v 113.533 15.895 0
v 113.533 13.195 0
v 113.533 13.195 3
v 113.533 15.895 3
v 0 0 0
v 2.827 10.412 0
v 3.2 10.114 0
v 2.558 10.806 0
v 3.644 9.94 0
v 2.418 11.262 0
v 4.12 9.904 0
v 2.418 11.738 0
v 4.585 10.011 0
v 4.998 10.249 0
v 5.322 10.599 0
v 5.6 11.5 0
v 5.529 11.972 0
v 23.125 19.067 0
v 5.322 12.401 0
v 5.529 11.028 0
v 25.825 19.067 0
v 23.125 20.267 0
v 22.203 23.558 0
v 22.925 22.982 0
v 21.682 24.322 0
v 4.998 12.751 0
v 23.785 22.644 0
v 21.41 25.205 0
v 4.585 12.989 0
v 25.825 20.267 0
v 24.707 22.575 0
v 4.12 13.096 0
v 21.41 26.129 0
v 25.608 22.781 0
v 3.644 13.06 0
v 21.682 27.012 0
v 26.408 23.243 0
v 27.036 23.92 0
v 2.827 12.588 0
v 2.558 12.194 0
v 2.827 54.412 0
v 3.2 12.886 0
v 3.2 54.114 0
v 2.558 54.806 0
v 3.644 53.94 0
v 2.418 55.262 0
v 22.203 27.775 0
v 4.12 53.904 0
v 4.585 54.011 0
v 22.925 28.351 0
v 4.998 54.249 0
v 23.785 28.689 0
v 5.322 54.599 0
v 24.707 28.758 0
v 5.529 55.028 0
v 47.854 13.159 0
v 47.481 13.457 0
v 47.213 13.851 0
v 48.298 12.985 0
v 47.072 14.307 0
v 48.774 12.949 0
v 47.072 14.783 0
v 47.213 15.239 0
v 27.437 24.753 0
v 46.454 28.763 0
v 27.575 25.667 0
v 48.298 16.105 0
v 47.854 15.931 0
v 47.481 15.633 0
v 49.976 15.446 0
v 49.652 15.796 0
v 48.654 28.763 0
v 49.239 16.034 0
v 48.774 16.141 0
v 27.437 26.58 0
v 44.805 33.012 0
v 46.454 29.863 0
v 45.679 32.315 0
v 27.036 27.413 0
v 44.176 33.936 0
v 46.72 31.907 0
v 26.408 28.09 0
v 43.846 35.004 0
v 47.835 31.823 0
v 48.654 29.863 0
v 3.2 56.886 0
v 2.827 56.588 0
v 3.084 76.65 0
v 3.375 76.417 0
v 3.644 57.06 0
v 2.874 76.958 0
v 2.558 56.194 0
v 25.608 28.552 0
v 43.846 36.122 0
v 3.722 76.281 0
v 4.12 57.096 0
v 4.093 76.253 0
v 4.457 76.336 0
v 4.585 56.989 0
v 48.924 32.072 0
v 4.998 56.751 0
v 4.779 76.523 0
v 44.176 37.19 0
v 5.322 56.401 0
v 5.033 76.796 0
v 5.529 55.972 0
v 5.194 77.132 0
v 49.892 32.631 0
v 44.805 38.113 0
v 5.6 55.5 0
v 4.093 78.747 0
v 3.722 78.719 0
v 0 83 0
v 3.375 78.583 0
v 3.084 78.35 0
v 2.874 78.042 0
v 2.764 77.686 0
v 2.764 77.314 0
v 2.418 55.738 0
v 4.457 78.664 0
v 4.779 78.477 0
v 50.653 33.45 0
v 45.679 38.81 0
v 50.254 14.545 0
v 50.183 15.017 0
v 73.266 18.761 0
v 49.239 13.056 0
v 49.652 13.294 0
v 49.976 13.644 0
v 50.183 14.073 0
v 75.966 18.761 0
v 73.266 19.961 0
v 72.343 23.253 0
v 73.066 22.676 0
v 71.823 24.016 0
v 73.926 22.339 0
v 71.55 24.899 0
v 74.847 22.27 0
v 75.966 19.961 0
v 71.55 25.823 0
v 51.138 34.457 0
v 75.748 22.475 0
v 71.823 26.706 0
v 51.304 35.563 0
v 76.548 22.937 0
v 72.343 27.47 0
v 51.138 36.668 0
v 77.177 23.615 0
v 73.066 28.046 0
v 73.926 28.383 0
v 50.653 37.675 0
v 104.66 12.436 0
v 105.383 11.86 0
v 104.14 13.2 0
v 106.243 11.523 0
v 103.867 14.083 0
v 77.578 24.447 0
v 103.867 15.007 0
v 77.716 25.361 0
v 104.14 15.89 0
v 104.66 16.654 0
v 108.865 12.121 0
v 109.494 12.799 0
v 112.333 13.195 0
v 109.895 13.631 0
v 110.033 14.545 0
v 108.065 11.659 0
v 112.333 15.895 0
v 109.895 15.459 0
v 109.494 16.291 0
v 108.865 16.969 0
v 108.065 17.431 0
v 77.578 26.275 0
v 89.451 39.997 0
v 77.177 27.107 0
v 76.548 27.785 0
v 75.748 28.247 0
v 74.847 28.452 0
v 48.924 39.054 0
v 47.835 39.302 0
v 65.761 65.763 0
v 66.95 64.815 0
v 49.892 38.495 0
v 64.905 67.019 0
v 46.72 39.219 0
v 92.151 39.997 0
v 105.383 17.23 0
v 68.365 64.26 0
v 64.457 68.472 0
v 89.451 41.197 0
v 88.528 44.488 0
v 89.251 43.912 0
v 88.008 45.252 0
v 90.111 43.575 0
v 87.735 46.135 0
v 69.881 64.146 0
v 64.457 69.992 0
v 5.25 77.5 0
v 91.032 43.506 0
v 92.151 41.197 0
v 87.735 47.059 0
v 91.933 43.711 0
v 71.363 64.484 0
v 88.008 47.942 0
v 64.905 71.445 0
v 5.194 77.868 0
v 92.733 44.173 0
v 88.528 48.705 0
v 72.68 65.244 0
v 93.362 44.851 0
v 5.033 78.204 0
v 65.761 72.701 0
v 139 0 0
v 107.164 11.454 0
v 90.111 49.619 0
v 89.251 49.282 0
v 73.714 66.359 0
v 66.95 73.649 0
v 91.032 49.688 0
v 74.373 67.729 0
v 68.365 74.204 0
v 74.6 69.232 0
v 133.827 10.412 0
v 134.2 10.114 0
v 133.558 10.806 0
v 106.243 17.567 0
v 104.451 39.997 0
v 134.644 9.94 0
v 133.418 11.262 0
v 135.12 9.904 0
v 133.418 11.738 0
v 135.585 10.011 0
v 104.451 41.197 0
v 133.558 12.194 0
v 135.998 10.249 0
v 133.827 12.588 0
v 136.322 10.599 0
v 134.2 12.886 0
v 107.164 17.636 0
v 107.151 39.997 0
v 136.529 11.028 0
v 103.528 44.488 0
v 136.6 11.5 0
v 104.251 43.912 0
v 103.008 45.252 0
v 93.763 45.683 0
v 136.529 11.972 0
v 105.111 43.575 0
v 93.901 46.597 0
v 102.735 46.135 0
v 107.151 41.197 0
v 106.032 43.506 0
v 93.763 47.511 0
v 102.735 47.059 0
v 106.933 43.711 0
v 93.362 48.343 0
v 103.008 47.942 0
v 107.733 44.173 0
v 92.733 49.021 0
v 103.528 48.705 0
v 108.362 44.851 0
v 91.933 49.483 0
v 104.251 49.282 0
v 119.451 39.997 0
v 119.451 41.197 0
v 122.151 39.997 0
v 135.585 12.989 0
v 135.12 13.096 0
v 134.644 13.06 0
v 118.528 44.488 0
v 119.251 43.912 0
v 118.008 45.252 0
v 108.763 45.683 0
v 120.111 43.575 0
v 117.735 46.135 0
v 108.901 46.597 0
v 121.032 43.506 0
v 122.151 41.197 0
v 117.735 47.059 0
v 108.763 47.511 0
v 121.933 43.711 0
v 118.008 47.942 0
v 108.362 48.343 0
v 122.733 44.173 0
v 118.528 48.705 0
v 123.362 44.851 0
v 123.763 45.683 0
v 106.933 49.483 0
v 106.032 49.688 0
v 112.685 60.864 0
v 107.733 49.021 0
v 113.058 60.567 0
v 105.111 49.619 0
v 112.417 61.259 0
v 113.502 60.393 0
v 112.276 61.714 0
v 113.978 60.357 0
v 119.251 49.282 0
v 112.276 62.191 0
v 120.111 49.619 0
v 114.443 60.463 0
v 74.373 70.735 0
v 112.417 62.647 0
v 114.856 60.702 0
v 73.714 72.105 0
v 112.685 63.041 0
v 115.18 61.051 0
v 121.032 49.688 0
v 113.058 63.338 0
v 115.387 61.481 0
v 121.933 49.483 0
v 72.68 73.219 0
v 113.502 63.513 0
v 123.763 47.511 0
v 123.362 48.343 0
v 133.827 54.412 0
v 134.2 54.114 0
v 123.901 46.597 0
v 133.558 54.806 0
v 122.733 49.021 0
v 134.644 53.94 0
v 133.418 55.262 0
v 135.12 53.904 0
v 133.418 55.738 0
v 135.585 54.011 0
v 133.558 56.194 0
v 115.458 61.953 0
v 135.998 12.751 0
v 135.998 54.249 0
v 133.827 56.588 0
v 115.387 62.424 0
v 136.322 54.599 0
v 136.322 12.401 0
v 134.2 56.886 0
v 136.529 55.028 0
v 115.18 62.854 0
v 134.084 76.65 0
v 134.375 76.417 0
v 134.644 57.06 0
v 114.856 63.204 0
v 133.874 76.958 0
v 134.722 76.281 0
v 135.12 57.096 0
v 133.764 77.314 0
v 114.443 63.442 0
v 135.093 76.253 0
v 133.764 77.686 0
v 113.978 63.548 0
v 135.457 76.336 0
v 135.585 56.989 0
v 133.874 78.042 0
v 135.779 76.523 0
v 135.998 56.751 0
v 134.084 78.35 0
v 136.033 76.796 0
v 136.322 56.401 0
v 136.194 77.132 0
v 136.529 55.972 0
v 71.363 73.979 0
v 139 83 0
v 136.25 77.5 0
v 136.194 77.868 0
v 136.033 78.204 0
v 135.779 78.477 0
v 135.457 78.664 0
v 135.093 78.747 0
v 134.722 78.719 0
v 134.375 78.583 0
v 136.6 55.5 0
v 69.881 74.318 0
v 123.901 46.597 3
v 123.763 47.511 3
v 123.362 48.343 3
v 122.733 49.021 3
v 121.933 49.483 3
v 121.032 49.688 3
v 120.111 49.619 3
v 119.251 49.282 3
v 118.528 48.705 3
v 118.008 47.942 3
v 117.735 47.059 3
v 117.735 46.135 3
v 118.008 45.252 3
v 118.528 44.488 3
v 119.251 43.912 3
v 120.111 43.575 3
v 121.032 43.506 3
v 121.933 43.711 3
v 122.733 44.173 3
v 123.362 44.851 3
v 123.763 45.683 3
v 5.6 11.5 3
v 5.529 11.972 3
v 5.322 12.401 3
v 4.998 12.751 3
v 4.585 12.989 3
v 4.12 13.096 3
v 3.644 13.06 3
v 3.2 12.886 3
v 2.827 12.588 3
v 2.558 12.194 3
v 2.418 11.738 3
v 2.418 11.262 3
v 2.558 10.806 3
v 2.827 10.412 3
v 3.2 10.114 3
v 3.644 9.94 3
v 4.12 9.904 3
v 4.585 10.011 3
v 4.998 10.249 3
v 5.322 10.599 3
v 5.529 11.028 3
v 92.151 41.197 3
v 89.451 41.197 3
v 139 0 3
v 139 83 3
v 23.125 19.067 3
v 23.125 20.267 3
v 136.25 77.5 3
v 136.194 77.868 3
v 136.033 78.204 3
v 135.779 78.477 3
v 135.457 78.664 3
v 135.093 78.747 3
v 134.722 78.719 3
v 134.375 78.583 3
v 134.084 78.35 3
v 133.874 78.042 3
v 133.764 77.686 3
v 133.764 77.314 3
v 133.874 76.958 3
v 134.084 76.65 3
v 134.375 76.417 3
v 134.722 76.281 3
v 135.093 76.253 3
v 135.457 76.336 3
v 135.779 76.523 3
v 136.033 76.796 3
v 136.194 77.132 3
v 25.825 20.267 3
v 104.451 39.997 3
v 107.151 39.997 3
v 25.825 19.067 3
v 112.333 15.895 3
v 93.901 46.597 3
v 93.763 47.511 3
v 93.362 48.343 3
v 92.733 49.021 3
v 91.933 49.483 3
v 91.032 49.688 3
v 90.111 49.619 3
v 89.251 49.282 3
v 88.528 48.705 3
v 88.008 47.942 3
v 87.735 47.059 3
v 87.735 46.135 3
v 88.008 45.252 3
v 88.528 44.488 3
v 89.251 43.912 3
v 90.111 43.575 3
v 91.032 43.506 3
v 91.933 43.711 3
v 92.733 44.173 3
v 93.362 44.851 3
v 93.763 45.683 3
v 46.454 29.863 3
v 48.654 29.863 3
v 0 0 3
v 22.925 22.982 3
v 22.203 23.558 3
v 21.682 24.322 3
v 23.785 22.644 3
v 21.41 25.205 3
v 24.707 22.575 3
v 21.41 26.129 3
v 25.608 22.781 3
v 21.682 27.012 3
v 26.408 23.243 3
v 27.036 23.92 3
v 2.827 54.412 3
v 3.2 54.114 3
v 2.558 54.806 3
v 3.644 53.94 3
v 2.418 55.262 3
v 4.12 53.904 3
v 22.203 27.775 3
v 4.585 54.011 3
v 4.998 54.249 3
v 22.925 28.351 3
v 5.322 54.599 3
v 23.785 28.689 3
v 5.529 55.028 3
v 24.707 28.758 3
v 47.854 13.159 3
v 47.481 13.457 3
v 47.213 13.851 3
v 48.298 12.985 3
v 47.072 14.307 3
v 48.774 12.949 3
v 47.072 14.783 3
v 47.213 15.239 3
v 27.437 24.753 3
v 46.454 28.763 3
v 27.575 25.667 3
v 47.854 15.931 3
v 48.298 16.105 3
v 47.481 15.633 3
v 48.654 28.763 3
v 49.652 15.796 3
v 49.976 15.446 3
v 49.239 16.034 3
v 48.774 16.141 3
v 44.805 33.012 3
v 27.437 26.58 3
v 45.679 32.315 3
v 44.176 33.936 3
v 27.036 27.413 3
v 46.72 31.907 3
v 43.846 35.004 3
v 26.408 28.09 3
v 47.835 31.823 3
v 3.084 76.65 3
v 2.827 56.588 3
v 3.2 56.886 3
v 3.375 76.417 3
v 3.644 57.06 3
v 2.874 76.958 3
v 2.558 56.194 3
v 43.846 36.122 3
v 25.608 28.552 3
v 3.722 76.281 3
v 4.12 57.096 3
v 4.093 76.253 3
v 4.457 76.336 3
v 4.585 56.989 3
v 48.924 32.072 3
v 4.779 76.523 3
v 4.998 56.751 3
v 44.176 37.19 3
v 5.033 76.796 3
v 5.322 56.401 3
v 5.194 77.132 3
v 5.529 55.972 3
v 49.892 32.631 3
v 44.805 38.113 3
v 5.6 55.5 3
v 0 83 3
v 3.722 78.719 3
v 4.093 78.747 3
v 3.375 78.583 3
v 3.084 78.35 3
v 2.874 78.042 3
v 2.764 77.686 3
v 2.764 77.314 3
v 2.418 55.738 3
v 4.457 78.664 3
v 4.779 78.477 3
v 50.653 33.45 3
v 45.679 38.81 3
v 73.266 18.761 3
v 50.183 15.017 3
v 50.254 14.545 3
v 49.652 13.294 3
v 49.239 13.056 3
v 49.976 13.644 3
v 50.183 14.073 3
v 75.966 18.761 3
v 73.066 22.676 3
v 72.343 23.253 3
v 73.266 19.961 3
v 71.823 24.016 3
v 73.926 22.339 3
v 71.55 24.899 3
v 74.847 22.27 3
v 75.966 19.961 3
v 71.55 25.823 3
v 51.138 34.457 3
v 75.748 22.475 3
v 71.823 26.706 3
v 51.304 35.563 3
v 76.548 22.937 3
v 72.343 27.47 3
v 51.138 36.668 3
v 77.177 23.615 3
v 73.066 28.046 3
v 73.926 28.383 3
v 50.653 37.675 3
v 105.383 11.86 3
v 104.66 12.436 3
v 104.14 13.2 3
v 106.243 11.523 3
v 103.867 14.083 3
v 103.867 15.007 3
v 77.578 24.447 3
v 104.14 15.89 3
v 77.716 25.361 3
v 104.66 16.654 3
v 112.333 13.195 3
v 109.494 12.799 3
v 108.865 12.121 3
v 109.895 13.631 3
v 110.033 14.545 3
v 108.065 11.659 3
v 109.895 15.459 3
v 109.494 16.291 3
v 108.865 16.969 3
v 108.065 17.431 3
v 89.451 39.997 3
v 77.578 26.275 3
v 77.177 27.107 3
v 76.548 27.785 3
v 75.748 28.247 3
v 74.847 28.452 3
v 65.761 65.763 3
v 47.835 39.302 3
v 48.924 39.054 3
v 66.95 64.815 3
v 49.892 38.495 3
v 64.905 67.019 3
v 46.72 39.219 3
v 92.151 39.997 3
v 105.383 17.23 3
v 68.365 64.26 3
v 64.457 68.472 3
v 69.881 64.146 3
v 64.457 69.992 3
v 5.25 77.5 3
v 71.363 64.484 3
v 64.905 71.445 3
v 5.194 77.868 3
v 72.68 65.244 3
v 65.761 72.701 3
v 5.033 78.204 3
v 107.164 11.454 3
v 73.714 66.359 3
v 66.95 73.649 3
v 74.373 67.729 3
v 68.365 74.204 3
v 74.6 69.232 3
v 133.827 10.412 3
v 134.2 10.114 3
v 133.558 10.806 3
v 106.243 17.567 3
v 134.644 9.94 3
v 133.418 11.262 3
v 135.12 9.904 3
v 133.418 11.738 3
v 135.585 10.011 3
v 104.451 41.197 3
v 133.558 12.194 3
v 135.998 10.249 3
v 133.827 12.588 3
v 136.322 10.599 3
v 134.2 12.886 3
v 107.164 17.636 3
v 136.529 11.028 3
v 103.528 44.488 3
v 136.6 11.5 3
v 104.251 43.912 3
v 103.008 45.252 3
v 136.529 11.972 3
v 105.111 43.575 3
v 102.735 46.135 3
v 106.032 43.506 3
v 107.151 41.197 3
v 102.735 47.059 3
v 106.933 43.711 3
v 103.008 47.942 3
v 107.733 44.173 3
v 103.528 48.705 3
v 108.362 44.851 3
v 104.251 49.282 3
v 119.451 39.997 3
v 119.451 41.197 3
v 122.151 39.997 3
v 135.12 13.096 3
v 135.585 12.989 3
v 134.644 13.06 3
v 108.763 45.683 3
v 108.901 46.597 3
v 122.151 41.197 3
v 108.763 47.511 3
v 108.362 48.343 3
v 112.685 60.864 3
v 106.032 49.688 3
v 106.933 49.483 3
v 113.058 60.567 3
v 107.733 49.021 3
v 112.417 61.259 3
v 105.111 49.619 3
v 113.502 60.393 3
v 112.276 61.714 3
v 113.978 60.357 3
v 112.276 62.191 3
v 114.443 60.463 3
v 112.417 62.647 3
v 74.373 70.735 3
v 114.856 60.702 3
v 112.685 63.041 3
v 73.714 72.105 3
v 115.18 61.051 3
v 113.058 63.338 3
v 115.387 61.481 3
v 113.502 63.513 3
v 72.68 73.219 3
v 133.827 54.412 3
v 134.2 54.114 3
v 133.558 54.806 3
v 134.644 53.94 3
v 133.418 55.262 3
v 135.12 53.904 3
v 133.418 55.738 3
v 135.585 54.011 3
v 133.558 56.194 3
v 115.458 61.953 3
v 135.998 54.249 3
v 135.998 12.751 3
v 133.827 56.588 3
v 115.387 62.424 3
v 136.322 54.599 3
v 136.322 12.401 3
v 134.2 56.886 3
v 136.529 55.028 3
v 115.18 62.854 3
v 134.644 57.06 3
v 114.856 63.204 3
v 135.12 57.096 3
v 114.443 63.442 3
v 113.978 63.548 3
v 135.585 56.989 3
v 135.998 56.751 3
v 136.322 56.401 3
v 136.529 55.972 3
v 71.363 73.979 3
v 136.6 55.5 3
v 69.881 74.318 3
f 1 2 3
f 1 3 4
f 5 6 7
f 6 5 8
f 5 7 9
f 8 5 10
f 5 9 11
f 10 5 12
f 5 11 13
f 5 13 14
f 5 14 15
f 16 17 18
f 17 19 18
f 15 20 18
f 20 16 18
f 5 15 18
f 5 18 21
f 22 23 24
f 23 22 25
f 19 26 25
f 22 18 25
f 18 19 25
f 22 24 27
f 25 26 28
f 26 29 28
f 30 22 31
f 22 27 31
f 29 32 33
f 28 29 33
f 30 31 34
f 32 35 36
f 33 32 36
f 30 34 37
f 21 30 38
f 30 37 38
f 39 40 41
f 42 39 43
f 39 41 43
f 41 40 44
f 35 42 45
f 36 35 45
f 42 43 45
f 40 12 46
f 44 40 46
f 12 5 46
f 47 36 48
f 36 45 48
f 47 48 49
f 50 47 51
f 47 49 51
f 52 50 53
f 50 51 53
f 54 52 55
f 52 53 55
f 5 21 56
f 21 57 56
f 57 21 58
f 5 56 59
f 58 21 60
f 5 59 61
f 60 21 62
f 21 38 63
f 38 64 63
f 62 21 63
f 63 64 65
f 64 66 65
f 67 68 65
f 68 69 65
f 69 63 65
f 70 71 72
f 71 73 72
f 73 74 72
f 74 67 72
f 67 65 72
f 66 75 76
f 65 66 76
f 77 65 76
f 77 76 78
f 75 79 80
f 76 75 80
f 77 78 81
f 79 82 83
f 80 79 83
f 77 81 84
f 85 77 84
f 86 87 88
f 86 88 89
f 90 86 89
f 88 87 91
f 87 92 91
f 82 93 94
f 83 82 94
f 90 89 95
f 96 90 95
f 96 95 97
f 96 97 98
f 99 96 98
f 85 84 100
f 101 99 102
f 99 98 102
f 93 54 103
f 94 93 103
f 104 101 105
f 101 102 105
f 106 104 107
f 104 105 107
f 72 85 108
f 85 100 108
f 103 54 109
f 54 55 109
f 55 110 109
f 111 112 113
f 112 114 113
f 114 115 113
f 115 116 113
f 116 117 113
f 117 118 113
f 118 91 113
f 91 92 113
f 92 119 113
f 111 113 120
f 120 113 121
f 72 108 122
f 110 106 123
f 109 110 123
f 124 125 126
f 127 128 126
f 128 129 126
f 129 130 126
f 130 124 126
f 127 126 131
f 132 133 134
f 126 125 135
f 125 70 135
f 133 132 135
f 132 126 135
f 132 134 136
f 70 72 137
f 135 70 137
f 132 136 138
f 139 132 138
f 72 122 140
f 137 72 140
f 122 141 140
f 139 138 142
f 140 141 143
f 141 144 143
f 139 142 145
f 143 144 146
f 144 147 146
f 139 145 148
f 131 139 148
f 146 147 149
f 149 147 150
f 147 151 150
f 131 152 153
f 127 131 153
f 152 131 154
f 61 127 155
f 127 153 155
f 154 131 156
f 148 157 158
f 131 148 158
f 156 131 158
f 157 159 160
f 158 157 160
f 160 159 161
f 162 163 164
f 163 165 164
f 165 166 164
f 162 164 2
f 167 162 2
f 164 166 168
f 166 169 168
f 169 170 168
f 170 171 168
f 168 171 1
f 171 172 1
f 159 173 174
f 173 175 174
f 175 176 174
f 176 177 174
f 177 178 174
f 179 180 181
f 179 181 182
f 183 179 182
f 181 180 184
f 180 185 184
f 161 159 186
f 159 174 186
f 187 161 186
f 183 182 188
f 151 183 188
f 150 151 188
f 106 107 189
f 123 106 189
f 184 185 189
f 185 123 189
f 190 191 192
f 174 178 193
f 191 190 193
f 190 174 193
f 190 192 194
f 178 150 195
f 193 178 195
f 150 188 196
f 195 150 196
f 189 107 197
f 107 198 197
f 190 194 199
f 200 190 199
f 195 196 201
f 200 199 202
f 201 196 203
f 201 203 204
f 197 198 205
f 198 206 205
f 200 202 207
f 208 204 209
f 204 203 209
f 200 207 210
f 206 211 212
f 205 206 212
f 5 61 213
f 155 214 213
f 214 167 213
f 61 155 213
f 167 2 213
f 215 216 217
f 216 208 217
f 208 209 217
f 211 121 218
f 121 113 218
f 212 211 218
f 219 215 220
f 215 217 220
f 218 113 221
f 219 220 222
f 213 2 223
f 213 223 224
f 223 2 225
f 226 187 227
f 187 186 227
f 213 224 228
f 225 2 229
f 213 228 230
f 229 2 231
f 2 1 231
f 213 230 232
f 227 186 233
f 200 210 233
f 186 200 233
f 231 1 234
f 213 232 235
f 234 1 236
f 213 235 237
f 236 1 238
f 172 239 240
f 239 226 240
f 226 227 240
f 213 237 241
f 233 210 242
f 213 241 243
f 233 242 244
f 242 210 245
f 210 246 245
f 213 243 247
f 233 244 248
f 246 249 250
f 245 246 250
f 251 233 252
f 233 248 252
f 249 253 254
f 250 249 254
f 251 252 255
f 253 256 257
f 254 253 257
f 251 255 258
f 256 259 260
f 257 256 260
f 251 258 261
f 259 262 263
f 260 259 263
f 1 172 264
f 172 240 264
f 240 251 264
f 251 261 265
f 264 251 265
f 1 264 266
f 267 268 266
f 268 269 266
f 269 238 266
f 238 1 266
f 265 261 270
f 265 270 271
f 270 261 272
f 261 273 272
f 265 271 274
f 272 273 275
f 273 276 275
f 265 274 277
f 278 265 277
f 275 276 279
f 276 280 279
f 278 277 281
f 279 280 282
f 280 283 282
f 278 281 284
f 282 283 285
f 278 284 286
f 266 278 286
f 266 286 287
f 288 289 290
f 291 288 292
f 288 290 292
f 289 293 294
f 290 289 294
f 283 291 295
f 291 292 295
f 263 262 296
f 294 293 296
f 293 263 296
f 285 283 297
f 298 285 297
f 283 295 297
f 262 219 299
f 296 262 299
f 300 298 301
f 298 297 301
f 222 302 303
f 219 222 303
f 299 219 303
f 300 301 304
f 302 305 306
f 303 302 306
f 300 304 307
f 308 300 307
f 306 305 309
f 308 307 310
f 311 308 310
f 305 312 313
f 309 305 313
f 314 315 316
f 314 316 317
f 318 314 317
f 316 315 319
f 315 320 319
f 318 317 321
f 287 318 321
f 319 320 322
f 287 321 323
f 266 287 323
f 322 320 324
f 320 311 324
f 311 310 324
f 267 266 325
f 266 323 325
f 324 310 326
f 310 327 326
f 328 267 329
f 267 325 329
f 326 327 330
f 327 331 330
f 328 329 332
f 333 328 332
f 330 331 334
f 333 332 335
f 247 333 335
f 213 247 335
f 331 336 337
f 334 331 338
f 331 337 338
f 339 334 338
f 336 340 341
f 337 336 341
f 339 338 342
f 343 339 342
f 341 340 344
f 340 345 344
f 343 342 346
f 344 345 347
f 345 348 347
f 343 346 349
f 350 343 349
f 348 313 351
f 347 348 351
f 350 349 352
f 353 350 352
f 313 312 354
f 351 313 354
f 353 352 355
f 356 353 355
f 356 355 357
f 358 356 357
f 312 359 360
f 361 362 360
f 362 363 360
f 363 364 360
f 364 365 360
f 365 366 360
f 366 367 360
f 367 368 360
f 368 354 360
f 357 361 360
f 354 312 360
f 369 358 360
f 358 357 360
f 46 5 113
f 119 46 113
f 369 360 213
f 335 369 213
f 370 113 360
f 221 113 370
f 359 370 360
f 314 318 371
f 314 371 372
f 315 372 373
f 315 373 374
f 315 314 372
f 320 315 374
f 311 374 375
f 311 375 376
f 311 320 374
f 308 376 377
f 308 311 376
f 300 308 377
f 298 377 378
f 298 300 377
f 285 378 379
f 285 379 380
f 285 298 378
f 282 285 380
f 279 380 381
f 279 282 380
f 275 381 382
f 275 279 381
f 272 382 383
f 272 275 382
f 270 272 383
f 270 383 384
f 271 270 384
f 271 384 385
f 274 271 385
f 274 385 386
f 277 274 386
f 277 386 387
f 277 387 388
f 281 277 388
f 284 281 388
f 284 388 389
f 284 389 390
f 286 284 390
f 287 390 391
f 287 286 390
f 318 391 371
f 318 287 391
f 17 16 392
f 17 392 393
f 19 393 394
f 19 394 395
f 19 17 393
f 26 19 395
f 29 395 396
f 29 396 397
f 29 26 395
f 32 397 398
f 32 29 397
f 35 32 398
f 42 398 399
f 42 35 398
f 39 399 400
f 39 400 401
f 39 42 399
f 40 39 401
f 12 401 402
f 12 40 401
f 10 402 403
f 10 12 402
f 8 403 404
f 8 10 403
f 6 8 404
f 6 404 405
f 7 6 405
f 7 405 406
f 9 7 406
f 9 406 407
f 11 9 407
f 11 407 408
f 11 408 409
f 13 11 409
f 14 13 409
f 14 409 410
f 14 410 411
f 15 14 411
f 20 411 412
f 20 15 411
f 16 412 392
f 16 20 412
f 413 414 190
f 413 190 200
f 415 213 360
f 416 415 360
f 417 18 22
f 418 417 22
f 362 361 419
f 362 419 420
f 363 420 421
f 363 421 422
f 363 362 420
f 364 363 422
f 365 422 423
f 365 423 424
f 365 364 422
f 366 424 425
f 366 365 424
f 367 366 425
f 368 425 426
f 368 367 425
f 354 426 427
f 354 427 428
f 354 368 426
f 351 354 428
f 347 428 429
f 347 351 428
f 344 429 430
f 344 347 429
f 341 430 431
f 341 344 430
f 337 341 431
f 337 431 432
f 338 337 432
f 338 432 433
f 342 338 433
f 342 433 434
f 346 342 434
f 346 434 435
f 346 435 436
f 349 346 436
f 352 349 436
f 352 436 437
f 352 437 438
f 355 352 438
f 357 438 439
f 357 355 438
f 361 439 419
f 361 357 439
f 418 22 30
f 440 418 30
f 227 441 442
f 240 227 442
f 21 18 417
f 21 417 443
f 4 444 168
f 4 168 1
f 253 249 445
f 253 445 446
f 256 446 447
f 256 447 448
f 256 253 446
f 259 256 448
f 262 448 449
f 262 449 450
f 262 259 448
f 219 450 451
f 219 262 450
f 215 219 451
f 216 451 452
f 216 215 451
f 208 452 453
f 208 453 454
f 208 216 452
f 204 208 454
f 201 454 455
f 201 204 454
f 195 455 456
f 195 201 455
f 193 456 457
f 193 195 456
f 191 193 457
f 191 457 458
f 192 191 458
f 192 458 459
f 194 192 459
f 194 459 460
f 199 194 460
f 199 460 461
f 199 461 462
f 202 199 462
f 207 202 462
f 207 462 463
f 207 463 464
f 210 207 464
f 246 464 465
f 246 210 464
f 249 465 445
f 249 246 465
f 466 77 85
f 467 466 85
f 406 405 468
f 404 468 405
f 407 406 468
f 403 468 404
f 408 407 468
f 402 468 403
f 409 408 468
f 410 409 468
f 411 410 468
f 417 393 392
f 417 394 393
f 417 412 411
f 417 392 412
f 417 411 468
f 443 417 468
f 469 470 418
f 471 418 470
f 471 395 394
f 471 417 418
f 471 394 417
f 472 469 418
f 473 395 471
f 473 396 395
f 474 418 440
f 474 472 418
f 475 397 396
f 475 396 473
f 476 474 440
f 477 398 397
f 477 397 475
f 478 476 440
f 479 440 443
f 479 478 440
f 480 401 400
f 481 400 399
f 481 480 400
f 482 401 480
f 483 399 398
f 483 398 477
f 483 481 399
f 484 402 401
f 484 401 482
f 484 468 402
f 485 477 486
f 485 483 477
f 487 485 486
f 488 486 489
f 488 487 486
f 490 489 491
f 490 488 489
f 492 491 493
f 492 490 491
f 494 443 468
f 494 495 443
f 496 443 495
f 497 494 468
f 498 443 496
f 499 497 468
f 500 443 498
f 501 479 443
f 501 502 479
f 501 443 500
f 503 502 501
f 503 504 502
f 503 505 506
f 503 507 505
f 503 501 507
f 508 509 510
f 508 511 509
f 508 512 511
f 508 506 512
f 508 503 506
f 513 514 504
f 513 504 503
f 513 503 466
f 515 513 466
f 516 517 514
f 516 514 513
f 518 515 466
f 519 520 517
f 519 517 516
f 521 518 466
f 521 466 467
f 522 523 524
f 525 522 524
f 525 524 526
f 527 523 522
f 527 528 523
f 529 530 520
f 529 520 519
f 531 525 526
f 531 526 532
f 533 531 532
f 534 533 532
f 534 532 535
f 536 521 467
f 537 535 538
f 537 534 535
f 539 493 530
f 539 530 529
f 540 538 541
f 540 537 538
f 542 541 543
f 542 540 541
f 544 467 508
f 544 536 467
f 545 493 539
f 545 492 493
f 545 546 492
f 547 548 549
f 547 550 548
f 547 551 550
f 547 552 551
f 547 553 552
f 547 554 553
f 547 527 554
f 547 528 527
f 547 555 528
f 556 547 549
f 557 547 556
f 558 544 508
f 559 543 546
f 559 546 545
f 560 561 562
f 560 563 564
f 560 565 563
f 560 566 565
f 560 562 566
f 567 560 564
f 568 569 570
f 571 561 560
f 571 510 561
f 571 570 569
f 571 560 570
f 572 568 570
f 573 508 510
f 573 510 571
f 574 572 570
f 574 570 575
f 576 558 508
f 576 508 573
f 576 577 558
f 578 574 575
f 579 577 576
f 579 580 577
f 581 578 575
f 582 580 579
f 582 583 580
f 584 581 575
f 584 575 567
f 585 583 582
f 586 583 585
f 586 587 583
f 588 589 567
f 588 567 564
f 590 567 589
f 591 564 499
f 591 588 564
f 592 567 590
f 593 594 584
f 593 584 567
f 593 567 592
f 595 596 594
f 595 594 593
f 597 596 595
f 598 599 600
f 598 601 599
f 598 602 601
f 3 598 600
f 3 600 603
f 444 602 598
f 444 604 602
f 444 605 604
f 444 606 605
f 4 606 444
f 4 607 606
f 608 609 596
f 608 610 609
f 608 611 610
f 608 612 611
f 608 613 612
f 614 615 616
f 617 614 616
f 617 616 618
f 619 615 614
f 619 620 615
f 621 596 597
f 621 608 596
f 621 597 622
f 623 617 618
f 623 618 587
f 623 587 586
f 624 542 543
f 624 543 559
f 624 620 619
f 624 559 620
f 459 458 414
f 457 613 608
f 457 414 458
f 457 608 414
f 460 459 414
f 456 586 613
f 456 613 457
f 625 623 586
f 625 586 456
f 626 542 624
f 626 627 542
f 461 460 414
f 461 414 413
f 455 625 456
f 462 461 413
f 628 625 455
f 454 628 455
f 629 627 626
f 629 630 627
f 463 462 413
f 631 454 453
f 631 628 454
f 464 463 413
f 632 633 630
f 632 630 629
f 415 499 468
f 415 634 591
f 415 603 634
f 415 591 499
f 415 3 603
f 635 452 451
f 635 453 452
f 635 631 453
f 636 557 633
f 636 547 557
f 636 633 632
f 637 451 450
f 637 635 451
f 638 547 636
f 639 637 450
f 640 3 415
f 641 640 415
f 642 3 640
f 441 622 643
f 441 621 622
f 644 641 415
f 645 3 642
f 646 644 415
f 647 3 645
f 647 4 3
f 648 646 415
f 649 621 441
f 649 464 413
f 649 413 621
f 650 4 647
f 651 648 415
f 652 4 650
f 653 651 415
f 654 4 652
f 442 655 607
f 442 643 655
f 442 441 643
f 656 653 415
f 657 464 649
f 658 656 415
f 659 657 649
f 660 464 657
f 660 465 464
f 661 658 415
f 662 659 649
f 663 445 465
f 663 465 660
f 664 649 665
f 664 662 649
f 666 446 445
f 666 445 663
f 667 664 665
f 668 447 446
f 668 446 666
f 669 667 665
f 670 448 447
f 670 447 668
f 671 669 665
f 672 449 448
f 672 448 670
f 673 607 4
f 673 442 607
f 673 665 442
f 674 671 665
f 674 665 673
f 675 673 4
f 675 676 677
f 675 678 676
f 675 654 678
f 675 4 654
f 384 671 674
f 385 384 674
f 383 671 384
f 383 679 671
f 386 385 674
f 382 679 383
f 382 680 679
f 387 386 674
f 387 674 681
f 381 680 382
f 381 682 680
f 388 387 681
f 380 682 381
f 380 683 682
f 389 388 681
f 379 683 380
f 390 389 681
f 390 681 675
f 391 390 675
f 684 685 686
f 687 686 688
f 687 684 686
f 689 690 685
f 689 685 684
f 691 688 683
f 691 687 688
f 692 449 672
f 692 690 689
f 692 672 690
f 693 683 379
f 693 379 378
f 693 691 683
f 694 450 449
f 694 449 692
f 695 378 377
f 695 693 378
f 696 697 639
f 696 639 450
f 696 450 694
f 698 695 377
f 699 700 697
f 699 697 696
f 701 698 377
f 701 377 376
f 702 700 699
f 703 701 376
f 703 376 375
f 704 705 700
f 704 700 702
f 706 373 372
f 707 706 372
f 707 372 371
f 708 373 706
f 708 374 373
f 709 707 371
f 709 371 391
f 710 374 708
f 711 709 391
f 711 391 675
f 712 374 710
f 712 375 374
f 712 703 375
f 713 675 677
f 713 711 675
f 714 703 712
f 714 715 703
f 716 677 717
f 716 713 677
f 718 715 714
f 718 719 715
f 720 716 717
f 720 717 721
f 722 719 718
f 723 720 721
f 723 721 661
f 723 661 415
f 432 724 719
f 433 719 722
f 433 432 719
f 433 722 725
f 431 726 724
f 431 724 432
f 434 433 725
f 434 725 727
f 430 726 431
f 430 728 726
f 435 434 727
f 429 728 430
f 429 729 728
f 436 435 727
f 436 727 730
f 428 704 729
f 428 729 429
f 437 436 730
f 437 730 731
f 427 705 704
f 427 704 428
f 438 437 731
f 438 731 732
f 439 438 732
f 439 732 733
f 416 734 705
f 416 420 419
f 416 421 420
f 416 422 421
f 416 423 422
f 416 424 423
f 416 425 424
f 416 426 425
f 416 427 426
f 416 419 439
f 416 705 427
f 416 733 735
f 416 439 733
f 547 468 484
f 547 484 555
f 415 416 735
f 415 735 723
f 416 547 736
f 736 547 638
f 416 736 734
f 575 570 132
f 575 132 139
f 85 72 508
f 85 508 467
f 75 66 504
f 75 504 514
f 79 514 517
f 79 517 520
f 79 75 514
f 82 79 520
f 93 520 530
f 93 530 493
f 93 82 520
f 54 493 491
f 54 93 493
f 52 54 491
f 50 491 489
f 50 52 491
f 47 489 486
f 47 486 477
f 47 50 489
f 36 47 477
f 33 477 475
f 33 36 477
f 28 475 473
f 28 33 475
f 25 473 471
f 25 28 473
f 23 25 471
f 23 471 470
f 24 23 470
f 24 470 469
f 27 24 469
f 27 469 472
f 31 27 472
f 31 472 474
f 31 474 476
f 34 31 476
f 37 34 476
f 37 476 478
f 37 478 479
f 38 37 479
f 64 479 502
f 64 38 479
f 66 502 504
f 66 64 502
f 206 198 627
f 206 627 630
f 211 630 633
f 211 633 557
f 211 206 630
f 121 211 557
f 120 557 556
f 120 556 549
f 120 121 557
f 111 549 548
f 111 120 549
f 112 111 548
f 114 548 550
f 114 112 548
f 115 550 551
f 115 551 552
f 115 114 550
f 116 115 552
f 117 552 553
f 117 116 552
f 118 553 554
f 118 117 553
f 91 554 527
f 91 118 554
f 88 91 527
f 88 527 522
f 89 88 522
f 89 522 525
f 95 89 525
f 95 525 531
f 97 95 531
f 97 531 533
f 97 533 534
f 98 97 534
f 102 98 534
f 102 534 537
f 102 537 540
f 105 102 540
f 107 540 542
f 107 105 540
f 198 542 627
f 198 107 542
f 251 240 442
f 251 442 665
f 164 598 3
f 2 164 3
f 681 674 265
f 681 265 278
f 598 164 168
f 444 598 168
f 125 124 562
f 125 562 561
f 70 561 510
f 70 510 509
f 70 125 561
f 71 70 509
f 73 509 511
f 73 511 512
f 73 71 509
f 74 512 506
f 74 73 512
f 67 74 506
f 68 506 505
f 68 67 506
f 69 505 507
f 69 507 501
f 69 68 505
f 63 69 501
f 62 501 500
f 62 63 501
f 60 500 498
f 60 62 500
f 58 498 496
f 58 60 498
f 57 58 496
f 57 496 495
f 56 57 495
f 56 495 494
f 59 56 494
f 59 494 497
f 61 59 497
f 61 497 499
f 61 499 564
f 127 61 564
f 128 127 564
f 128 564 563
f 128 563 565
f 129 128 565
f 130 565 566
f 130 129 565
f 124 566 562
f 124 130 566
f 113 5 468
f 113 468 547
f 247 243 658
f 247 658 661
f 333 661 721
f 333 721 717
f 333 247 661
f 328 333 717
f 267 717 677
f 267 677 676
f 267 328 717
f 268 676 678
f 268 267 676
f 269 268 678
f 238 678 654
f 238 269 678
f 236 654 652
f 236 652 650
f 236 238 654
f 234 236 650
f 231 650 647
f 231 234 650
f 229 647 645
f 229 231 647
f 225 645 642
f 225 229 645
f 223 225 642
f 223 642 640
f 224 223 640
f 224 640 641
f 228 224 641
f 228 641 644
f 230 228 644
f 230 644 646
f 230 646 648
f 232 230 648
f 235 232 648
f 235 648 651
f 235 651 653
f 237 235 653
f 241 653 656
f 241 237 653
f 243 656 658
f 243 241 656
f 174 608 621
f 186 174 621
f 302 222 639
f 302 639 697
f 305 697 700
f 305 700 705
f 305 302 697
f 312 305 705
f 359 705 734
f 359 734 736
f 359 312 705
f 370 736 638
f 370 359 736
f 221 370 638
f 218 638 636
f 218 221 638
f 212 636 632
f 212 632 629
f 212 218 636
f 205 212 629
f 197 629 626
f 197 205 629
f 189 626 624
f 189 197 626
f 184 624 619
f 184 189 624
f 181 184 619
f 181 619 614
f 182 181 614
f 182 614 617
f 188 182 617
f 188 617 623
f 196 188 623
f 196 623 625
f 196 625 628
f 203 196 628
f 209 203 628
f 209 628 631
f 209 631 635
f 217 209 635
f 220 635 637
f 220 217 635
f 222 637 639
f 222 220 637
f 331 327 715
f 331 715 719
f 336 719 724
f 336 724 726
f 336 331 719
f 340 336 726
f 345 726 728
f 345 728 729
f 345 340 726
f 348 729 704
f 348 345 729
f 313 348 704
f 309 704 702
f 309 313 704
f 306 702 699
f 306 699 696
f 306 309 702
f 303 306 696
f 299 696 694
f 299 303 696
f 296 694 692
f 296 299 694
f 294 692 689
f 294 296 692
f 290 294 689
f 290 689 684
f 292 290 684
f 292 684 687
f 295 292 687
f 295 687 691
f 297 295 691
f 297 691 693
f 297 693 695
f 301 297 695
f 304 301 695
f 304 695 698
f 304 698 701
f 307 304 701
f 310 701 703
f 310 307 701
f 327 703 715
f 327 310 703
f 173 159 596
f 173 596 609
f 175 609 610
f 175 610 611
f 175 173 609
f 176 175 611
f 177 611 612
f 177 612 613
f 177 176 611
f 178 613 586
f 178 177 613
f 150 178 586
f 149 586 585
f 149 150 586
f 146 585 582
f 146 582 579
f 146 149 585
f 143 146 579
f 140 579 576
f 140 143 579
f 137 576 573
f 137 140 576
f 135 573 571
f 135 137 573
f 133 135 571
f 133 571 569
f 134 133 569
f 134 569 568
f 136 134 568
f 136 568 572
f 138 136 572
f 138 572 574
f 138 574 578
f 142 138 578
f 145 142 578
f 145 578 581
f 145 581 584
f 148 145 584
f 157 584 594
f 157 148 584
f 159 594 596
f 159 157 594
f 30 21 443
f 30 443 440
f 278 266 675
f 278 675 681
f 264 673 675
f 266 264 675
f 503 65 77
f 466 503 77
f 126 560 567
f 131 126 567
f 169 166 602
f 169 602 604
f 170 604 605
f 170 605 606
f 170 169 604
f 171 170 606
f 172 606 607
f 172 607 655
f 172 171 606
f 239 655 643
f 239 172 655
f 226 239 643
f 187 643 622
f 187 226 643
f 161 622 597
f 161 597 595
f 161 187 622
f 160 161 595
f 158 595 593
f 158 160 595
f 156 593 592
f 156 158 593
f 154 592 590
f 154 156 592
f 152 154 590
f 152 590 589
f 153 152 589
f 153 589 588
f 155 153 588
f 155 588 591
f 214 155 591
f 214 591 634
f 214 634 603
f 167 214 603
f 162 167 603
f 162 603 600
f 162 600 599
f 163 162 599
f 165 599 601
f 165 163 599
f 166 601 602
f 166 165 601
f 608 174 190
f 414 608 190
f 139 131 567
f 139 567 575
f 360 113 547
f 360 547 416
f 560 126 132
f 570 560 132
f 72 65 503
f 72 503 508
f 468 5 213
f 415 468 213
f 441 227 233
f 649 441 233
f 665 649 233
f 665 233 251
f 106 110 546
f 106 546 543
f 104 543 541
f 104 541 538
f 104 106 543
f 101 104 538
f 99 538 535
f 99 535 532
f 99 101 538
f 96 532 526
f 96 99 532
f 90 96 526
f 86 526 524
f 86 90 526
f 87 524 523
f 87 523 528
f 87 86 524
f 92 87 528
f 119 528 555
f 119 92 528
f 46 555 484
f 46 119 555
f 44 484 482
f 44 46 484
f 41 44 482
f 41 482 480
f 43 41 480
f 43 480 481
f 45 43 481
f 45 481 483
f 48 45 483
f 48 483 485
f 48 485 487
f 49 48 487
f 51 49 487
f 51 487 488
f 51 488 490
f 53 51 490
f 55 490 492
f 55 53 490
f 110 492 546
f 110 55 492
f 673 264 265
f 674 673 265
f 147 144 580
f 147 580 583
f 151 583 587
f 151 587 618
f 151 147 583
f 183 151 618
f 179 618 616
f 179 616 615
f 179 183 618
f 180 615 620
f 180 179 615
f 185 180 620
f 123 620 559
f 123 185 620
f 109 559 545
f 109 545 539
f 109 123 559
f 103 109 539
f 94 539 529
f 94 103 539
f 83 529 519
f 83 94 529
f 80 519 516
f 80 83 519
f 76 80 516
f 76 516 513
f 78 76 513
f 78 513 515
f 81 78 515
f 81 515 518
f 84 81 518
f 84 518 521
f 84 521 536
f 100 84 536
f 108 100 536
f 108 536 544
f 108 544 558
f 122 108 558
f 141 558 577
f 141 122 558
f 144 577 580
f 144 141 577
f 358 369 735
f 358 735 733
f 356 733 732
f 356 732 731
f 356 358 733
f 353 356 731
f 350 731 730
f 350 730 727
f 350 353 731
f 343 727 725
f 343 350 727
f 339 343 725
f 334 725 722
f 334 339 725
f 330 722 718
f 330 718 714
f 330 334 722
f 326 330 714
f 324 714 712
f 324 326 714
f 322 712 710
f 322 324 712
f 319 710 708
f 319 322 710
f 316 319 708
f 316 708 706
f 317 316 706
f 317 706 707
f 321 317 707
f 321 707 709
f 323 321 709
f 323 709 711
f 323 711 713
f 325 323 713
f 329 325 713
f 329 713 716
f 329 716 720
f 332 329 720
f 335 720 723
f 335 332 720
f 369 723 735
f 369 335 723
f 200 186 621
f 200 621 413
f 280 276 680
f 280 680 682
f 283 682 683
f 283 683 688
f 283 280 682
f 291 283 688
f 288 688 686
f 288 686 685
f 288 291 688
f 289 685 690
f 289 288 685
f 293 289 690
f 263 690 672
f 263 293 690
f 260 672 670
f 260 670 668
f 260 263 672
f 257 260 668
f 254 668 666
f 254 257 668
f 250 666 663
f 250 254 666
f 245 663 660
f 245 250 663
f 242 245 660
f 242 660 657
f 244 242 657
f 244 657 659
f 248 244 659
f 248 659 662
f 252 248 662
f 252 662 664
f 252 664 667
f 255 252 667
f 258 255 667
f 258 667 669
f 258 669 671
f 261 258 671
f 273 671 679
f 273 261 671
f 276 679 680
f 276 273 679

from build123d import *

# Parameters (mm, degrees)
SKETCH1_W           = 139
SKETCH1_H           = 83
SKETCH1_R           = 1.6
SKETCH1_R_2         = 3.1
SKETCH1_R_3         = 1.25
SKETCH1_R_4         = 3.75
SKETCH1_R_5         = 5.1
SKETCH1_W_2         = 2.7
SKETCH1_H_2         = 1.2
SKETCH1_W_3         = 1.2
SKETCH1_H_3         = 2.7
SKETCH1_W_4         = 2.2
SKETCH1_H_4         = 1.1
BOSS_EXTRUDE1_DEPTH = 3


with BuildPart() as part:
    # Sketch1 → Boss-Extrude1 (new body)
    with BuildSketch(Plane.XY):
        with Locations((69.5, 41.5)):
            Rectangle(SKETCH1_W, SKETCH1_H)
        with Locations((4, 55.5)):
            Circle(SKETCH1_R, mode=Mode.SUBTRACT)
        with Locations((135, 55.5)):
            Circle(SKETCH1_R, mode=Mode.SUBTRACT)
        with Locations((135, 11.5)):
            Circle(SKETCH1_R, mode=Mode.SUBTRACT)
        with Locations((4, 11.5)):
            Circle(SKETCH1_R, mode=Mode.SUBTRACT)
        with Locations((48.65436543, 14.544998484)):
            Circle(SKETCH1_R, mode=Mode.SUBTRACT)
        with Locations((24.475038928, 25.666634818)):
            Circle(SKETCH1_R_2, mode=Mode.SUBTRACT)
        with Locations((135, 77.5)):
            Circle(SKETCH1_R_3, mode=Mode.SUBTRACT)
        with Locations((4, 77.5)):
            Circle(SKETCH1_R_3, mode=Mode.SUBTRACT)
        with Locations((74.615565323, 25.361106272)):
            Circle(SKETCH1_R_2, mode=Mode.SUBTRACT)
        with Locations((106.932598637, 14.544998484)):
            Circle(SKETCH1_R_2, mode=Mode.SUBTRACT)
        with Locations((47.55436543, 35.562774654)):
            Circle(SKETCH1_R_4, mode=Mode.SUBTRACT)
        with Locations((69.5, 69.231811206)):
            Circle(SKETCH1_R_5, mode=Mode.SUBTRACT)
        with Locations((113.858121324, 61.952726152)):
            Circle(SKETCH1_R, mode=Mode.SUBTRACT)
        with Locations((90.80059856, 46.596907859)):
            Circle(SKETCH1_R_2, mode=Mode.SUBTRACT)
        with Locations((105.80059856, 46.596907859)):
            Circle(SKETCH1_R_2, mode=Mode.SUBTRACT)
        with Locations((120.80059856, 46.596907859)):
            Circle(SKETCH1_R_2, mode=Mode.SUBTRACT)
        with Locations((74.615565323, 19.361106272)):
            Rectangle(SKETCH1_W_2, SKETCH1_H_2, mode=Mode.SUBTRACT)
        with Locations((24.475038928, 19.666634818)):
            Rectangle(SKETCH1_W_2, SKETCH1_H_2, mode=Mode.SUBTRACT)
        with Locations((112.932598637, 14.544998484)):
            Rectangle(SKETCH1_W_3, SKETCH1_H_3, mode=Mode.SUBTRACT)
        with Locations((47.55436543, 29.312774654)):
            Rectangle(SKETCH1_W_4, SKETCH1_H_4, mode=Mode.SUBTRACT)
        with Locations((90.80059856, 40.596907859)):
            Rectangle(SKETCH1_W_2, SKETCH1_H_2, mode=Mode.SUBTRACT)
        with Locations((105.80059856, 40.596907859)):
            Rectangle(SKETCH1_W_2, SKETCH1_H_2, mode=Mode.SUBTRACT)
        with Locations((120.80059856, 40.596907859)):
            Rectangle(SKETCH1_W_2, SKETCH1_H_2, mode=Mode.SUBTRACT)
    extrude(amount=BOSS_EXTRUDE1_DEPTH)


solid = part.part
